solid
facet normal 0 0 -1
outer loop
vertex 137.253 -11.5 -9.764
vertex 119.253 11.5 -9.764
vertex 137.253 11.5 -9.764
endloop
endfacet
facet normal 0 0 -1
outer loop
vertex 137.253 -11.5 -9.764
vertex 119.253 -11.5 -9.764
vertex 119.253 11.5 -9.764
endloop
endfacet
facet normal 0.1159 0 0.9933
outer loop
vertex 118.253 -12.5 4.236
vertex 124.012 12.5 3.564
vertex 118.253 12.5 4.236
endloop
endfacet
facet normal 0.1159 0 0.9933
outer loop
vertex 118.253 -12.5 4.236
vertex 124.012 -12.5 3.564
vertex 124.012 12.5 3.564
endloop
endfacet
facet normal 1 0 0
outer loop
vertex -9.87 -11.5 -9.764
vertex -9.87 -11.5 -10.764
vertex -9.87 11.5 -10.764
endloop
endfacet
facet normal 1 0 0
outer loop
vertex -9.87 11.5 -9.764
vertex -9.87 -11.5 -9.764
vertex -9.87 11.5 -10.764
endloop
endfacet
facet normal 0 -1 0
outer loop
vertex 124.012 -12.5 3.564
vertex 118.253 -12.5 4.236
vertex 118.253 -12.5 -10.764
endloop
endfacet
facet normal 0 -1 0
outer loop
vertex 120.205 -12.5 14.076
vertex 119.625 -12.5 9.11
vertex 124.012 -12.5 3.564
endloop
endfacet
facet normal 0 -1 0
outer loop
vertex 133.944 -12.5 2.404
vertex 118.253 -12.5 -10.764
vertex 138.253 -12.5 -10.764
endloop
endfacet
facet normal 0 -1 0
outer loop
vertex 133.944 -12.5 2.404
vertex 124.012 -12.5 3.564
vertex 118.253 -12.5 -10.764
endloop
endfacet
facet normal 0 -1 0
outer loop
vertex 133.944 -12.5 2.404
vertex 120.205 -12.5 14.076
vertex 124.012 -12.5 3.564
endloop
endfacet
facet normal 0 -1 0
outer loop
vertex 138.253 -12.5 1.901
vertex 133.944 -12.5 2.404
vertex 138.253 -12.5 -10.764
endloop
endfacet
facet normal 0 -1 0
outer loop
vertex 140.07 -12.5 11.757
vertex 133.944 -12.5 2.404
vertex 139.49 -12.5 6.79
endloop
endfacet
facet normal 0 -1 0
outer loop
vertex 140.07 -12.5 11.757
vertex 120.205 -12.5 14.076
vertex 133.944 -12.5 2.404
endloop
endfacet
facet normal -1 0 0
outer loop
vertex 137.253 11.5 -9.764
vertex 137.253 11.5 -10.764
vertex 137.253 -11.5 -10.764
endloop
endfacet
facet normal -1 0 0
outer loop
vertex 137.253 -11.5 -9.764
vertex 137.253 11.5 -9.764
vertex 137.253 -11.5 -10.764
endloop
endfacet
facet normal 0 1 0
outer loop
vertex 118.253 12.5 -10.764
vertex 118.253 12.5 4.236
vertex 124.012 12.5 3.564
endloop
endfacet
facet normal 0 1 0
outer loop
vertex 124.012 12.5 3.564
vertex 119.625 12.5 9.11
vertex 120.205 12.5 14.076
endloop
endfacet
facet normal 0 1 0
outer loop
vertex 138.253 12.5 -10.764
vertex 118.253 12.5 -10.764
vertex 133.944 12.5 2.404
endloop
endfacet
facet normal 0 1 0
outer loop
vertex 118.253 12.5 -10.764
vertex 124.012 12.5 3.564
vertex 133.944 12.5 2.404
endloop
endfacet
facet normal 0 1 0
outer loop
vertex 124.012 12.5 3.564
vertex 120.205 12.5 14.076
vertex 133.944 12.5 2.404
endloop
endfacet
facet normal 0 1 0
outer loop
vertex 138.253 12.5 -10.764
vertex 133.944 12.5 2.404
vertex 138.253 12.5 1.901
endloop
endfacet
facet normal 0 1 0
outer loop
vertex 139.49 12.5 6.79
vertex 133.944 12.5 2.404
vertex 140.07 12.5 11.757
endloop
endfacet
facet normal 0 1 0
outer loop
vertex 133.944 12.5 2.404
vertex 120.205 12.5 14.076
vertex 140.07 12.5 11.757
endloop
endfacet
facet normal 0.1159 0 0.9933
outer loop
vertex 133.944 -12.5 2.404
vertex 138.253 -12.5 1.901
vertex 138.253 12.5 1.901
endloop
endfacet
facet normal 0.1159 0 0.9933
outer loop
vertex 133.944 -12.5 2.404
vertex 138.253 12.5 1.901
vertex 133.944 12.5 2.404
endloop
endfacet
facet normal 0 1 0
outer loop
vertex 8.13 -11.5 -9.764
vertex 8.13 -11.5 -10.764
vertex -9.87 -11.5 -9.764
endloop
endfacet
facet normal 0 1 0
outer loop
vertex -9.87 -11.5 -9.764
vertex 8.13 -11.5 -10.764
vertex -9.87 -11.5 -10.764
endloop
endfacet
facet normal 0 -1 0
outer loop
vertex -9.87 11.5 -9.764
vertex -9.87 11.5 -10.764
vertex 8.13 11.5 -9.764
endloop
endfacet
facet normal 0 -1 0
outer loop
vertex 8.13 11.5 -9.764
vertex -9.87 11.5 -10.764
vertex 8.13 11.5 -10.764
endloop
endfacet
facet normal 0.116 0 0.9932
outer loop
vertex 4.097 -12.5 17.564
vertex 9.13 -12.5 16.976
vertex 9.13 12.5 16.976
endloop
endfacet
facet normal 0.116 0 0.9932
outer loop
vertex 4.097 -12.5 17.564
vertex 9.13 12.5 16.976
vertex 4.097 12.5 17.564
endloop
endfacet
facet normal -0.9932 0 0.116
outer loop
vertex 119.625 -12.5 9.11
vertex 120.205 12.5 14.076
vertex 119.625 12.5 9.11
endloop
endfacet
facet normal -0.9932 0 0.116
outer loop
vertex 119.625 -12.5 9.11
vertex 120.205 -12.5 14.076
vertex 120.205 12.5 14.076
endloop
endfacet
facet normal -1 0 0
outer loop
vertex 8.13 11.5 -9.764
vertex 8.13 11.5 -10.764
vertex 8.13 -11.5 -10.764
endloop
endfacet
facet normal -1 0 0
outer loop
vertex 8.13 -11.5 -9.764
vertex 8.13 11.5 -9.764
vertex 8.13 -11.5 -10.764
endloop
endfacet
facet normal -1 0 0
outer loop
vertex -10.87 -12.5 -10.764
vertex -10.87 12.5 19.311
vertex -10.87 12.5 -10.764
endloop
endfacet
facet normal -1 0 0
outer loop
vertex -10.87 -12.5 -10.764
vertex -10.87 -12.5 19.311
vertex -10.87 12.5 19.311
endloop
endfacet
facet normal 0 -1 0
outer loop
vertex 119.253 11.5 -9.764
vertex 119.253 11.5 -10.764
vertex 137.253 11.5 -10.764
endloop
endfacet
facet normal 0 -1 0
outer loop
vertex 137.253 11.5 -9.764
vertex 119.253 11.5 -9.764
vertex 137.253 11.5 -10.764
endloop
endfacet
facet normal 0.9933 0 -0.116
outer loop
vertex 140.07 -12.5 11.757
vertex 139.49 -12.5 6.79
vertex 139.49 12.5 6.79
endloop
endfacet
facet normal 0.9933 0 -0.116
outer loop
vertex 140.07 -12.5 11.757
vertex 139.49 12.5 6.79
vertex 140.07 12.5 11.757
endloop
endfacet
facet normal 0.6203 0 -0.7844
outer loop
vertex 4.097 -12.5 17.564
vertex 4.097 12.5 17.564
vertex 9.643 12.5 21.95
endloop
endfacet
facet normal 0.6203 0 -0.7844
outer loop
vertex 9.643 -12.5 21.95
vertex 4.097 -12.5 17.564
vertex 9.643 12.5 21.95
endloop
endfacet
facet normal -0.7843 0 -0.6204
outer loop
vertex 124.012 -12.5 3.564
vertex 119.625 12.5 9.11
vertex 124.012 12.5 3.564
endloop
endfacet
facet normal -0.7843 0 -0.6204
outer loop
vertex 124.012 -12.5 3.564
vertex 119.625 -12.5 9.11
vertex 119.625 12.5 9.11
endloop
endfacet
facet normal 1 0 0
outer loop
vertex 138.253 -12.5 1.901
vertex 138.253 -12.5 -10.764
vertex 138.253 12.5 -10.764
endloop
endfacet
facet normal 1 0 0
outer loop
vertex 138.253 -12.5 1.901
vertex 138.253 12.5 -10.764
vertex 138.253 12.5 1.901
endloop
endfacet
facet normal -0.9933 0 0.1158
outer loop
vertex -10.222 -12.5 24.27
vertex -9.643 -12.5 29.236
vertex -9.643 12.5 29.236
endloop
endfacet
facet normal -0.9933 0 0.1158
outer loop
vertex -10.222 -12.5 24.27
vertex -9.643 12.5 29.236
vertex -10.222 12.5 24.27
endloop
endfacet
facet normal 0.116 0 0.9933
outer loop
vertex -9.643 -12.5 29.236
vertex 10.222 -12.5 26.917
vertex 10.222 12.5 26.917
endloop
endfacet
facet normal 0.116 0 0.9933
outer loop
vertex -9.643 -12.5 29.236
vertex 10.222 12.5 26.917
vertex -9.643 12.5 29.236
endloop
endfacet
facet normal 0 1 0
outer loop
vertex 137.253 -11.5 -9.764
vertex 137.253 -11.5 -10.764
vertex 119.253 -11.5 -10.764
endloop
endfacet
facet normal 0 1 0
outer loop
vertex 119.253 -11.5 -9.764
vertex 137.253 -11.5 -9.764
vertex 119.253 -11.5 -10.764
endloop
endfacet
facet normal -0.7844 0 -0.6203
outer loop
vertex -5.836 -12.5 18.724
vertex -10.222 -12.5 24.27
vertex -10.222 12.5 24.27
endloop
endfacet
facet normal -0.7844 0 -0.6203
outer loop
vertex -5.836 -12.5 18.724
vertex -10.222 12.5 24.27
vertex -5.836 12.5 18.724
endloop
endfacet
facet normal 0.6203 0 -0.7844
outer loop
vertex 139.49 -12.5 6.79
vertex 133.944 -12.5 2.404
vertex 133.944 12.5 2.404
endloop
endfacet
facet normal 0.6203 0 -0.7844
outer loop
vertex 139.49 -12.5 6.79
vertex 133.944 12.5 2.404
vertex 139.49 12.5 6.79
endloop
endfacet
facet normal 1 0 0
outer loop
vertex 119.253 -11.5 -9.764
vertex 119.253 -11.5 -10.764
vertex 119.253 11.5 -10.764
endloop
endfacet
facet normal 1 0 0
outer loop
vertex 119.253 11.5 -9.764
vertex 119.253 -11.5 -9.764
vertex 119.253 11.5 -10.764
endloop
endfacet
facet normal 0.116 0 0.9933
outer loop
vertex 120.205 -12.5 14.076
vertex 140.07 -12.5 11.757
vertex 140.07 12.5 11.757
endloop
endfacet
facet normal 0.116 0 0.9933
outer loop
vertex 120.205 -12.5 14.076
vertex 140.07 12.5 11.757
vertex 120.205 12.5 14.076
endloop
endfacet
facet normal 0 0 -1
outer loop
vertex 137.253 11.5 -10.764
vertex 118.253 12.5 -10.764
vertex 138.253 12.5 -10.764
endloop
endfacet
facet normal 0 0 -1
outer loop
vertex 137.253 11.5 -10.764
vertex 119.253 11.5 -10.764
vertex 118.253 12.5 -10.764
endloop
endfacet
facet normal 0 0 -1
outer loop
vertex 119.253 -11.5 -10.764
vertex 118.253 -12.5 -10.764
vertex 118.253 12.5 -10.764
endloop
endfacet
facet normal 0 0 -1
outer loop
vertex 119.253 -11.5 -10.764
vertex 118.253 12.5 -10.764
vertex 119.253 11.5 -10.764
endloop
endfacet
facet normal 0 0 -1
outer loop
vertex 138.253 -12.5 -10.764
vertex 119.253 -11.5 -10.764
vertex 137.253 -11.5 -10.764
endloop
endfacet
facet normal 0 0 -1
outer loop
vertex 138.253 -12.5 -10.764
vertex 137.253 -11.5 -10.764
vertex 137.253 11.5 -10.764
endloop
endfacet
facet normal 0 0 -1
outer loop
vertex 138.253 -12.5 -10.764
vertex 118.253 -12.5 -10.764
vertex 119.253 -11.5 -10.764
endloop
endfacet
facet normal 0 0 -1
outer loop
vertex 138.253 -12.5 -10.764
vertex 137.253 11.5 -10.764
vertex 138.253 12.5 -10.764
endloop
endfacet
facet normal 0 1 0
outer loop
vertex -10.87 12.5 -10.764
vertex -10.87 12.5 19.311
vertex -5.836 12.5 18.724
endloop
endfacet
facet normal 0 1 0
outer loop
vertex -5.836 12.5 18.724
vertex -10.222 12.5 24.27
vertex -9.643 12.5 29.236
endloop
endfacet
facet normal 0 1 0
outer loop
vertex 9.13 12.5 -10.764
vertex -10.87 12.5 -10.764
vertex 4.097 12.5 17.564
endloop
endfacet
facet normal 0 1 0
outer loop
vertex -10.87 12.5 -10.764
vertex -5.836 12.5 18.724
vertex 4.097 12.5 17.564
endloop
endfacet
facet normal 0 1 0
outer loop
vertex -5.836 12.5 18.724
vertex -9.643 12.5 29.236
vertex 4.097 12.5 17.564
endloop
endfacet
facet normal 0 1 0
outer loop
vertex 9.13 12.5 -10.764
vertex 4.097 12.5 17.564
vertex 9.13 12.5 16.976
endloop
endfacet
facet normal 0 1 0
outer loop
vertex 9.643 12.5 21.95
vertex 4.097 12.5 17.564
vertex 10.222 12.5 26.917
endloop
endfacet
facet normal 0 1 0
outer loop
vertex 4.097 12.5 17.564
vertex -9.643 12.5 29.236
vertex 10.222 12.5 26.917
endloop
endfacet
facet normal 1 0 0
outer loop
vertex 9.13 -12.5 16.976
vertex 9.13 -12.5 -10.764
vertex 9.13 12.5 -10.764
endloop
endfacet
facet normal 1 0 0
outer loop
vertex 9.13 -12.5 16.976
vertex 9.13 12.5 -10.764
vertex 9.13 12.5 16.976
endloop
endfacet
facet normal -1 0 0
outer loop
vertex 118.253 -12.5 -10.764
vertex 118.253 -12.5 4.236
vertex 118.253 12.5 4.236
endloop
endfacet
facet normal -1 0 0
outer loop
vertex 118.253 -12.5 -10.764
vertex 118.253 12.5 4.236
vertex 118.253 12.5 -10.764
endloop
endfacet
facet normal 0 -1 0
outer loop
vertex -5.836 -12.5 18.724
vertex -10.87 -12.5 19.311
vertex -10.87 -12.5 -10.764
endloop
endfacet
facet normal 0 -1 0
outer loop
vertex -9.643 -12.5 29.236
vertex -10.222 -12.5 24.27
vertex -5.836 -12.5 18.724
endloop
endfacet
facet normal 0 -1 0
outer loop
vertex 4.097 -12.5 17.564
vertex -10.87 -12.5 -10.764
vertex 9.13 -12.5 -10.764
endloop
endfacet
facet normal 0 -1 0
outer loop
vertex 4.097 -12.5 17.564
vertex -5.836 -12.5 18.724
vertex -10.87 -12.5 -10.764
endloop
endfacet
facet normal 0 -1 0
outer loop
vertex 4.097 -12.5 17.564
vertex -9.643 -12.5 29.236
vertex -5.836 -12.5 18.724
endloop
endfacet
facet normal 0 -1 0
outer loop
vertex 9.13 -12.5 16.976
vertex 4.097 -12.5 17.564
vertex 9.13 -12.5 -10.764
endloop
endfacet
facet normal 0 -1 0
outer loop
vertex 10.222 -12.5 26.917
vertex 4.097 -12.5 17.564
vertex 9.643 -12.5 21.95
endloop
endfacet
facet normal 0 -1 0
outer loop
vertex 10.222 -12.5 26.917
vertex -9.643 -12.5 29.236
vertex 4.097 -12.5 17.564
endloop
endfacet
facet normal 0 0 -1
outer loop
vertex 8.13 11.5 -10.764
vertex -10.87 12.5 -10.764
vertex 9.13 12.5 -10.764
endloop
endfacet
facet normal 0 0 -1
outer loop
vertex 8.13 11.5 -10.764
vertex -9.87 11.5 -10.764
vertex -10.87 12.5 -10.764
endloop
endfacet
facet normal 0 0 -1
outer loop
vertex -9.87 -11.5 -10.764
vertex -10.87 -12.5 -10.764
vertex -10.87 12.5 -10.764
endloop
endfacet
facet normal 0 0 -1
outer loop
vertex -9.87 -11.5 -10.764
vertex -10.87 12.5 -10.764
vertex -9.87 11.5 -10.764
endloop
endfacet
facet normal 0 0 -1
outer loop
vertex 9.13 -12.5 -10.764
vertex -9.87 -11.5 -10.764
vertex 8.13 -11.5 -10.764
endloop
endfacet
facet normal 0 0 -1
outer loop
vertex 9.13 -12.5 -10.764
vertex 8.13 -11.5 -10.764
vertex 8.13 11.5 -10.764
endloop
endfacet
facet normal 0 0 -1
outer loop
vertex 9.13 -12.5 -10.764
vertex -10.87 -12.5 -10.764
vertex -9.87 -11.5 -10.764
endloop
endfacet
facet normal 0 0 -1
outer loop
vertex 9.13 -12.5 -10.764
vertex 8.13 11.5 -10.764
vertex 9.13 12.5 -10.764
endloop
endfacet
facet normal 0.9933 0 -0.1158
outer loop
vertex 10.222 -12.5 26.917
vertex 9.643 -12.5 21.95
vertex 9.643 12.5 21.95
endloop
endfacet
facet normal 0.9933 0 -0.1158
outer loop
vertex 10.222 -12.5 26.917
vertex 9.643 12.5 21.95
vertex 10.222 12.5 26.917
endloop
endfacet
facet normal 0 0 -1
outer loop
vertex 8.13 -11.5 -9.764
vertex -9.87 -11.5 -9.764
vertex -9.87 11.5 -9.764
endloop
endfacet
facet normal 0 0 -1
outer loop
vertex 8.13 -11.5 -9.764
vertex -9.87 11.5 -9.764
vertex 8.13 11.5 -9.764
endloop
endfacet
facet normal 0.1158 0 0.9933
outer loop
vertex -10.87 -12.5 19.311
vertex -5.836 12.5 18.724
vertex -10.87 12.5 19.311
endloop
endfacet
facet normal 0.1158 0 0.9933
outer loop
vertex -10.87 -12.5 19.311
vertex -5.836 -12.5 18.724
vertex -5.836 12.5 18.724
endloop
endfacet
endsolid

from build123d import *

# Parameters (mm, degrees)
F0_W     = 20
F0_H     = 27.7403057384
F1_DEPTH = 12.5
F0_W_2   = 10
F0_H_2   = 12.6649629206
F3_W     = 9
F3_H     = 11.5
F4_DEPTH = 1
F2_W     = 9
F2_H     = 11.5
F5_DEPTH = 1


with BuildPart() as f1:
    # F0 (on Front) → F1 (new body, symmetric)
    with BuildSketch(Plane.XZ):
        with Locations((-0.8697313164, 3.1060690337)):
            Rectangle(F0_W, F0_H)
        Polygon((-10.8697313164, 16.9762219029), (9.1302686836, 16.9762219029), (4.0965356669, 17.563919565), (-0.8697313164, 18.1437404426), (-5.8359982998, 18.7235613202), (-10.8697313164, 19.3112589823), align=None)
        Polygon((-5.8359982998, 18.7235613202), (-0.8697313164, 18.1437404426), (-0.2899104388, 23.1100074259), (-5.2561774222, 23.6898283036), align=None)
        Polygon((-0.2899104388, 23.1100074259), (4.6763565445, 22.5301865483), (9.6426235279, 21.9503656707), (10.2224444055, 26.9166326541), (-9.6426235279, 29.2359161645), (-10.2224444055, 24.2696491812), (-5.2561774222, 23.6898283036), align=None)
        Polygon((-0.8697313164, 18.1437404426), (4.0965356669, 17.563919565), (4.6763565445, 22.5301865483), (-0.2899104388, 23.1100074259), align=None)
        Polygon((4.6763565445, 22.5301865483), (4.0965356669, 17.563919565), (9.6426235279, 21.9503656707), align=None)
        Polygon((-10.2224444055, 24.2696491812), (-5.8359982998, 18.7235613202), (-5.2561774222, 23.6898283036), align=None)
    extrude(amount=F1_DEPTH, both=True)

    # F3 (on face) → F4 (cut)
    with BuildSketch(Plane(origin=(0, 0, -10.7640838355), x_dir=(1, 0, 0), z_dir=(0, 0, -1))):
        with Locations((-5.3697313164, 5.75)):
            Rectangle(F3_W, F3_H)
        with Locations((3.6302686836, 5.75)):
            Rectangle(F3_W, F3_H)
        with Locations((3.6302686836, -5.75)):
            Rectangle(F3_W, F3_H)
        with Locations((-5.3697313164, -5.75)):
            Rectangle(F3_W, F3_H)
    extrude(amount=-F4_DEPTH, mode=Mode.SUBTRACT)


with BuildPart() as f1b:
    # F0 (on Front) → F1, piece 2 (new body, symmetric)
    with BuildSketch(Plane.XZ):
        Polygon((124.5914150333, 8.5298811511), (124.0115941557, 3.5636141677), (128.2532102506, 3.0683976248), (133.9441281224, 2.4039724125), (134.523949, 7.3702393959), (139.4902159833, 6.7904185183), (140.070036861, 11.7566855016), (120.2049689276, 14.075969012), (119.62514805, 9.1097020287), align=None)
        with Locations((123.2532102506, -4.4316023752)):
            Rectangle(F0_W_2, F0_H_2)
        with Locations((133.2532102506, -4.4316023752)):
            Rectangle(F0_W_2, F0_H_2)
        Polygon((128.2532102506, 3.0683976248), (128.2532102506, 1.9008790851), (138.2532102506, 1.9008790851), (133.9441281224, 2.4039724125), align=None)
        Polygon((124.0115941557, 3.5636141677), (118.2532102506, 4.2359161645), (118.2532102506, 1.9008790851), (128.2532102506, 1.9008790851), (128.2532102506, 3.0683976248), align=None)
        Polygon((134.523949, 7.3702393959), (133.9441281224, 2.4039724125), (139.4902159833, 6.7904185183), align=None)
        Polygon((119.62514805, 9.1097020287), (124.0115941557, 3.5636141677), (124.5914150333, 8.5298811511), align=None)
    extrude(amount=F1_DEPTH, both=True)

    # F2 (on face) → F5 (cut)
    with BuildSketch(Plane(origin=(0, 0, -10.7640838355), x_dir=(1, 0, 0), z_dir=(0, 0, -1))):
        with Locations((132.7532102506, 5.75)):
            Rectangle(F2_W, F2_H)
        with Locations((132.7532102506, -5.75)):
            Rectangle(F2_W, F2_H)
        with Locations((123.7532102506, -5.75)):
            Rectangle(F2_W, F2_H)
        with Locations((123.7532102506, 5.75)):
            Rectangle(F2_W, F2_H)
    extrude(amount=-F5_DEPTH, mode=Mode.SUBTRACT)


solid = Compound([f1.part, f1b.part])
